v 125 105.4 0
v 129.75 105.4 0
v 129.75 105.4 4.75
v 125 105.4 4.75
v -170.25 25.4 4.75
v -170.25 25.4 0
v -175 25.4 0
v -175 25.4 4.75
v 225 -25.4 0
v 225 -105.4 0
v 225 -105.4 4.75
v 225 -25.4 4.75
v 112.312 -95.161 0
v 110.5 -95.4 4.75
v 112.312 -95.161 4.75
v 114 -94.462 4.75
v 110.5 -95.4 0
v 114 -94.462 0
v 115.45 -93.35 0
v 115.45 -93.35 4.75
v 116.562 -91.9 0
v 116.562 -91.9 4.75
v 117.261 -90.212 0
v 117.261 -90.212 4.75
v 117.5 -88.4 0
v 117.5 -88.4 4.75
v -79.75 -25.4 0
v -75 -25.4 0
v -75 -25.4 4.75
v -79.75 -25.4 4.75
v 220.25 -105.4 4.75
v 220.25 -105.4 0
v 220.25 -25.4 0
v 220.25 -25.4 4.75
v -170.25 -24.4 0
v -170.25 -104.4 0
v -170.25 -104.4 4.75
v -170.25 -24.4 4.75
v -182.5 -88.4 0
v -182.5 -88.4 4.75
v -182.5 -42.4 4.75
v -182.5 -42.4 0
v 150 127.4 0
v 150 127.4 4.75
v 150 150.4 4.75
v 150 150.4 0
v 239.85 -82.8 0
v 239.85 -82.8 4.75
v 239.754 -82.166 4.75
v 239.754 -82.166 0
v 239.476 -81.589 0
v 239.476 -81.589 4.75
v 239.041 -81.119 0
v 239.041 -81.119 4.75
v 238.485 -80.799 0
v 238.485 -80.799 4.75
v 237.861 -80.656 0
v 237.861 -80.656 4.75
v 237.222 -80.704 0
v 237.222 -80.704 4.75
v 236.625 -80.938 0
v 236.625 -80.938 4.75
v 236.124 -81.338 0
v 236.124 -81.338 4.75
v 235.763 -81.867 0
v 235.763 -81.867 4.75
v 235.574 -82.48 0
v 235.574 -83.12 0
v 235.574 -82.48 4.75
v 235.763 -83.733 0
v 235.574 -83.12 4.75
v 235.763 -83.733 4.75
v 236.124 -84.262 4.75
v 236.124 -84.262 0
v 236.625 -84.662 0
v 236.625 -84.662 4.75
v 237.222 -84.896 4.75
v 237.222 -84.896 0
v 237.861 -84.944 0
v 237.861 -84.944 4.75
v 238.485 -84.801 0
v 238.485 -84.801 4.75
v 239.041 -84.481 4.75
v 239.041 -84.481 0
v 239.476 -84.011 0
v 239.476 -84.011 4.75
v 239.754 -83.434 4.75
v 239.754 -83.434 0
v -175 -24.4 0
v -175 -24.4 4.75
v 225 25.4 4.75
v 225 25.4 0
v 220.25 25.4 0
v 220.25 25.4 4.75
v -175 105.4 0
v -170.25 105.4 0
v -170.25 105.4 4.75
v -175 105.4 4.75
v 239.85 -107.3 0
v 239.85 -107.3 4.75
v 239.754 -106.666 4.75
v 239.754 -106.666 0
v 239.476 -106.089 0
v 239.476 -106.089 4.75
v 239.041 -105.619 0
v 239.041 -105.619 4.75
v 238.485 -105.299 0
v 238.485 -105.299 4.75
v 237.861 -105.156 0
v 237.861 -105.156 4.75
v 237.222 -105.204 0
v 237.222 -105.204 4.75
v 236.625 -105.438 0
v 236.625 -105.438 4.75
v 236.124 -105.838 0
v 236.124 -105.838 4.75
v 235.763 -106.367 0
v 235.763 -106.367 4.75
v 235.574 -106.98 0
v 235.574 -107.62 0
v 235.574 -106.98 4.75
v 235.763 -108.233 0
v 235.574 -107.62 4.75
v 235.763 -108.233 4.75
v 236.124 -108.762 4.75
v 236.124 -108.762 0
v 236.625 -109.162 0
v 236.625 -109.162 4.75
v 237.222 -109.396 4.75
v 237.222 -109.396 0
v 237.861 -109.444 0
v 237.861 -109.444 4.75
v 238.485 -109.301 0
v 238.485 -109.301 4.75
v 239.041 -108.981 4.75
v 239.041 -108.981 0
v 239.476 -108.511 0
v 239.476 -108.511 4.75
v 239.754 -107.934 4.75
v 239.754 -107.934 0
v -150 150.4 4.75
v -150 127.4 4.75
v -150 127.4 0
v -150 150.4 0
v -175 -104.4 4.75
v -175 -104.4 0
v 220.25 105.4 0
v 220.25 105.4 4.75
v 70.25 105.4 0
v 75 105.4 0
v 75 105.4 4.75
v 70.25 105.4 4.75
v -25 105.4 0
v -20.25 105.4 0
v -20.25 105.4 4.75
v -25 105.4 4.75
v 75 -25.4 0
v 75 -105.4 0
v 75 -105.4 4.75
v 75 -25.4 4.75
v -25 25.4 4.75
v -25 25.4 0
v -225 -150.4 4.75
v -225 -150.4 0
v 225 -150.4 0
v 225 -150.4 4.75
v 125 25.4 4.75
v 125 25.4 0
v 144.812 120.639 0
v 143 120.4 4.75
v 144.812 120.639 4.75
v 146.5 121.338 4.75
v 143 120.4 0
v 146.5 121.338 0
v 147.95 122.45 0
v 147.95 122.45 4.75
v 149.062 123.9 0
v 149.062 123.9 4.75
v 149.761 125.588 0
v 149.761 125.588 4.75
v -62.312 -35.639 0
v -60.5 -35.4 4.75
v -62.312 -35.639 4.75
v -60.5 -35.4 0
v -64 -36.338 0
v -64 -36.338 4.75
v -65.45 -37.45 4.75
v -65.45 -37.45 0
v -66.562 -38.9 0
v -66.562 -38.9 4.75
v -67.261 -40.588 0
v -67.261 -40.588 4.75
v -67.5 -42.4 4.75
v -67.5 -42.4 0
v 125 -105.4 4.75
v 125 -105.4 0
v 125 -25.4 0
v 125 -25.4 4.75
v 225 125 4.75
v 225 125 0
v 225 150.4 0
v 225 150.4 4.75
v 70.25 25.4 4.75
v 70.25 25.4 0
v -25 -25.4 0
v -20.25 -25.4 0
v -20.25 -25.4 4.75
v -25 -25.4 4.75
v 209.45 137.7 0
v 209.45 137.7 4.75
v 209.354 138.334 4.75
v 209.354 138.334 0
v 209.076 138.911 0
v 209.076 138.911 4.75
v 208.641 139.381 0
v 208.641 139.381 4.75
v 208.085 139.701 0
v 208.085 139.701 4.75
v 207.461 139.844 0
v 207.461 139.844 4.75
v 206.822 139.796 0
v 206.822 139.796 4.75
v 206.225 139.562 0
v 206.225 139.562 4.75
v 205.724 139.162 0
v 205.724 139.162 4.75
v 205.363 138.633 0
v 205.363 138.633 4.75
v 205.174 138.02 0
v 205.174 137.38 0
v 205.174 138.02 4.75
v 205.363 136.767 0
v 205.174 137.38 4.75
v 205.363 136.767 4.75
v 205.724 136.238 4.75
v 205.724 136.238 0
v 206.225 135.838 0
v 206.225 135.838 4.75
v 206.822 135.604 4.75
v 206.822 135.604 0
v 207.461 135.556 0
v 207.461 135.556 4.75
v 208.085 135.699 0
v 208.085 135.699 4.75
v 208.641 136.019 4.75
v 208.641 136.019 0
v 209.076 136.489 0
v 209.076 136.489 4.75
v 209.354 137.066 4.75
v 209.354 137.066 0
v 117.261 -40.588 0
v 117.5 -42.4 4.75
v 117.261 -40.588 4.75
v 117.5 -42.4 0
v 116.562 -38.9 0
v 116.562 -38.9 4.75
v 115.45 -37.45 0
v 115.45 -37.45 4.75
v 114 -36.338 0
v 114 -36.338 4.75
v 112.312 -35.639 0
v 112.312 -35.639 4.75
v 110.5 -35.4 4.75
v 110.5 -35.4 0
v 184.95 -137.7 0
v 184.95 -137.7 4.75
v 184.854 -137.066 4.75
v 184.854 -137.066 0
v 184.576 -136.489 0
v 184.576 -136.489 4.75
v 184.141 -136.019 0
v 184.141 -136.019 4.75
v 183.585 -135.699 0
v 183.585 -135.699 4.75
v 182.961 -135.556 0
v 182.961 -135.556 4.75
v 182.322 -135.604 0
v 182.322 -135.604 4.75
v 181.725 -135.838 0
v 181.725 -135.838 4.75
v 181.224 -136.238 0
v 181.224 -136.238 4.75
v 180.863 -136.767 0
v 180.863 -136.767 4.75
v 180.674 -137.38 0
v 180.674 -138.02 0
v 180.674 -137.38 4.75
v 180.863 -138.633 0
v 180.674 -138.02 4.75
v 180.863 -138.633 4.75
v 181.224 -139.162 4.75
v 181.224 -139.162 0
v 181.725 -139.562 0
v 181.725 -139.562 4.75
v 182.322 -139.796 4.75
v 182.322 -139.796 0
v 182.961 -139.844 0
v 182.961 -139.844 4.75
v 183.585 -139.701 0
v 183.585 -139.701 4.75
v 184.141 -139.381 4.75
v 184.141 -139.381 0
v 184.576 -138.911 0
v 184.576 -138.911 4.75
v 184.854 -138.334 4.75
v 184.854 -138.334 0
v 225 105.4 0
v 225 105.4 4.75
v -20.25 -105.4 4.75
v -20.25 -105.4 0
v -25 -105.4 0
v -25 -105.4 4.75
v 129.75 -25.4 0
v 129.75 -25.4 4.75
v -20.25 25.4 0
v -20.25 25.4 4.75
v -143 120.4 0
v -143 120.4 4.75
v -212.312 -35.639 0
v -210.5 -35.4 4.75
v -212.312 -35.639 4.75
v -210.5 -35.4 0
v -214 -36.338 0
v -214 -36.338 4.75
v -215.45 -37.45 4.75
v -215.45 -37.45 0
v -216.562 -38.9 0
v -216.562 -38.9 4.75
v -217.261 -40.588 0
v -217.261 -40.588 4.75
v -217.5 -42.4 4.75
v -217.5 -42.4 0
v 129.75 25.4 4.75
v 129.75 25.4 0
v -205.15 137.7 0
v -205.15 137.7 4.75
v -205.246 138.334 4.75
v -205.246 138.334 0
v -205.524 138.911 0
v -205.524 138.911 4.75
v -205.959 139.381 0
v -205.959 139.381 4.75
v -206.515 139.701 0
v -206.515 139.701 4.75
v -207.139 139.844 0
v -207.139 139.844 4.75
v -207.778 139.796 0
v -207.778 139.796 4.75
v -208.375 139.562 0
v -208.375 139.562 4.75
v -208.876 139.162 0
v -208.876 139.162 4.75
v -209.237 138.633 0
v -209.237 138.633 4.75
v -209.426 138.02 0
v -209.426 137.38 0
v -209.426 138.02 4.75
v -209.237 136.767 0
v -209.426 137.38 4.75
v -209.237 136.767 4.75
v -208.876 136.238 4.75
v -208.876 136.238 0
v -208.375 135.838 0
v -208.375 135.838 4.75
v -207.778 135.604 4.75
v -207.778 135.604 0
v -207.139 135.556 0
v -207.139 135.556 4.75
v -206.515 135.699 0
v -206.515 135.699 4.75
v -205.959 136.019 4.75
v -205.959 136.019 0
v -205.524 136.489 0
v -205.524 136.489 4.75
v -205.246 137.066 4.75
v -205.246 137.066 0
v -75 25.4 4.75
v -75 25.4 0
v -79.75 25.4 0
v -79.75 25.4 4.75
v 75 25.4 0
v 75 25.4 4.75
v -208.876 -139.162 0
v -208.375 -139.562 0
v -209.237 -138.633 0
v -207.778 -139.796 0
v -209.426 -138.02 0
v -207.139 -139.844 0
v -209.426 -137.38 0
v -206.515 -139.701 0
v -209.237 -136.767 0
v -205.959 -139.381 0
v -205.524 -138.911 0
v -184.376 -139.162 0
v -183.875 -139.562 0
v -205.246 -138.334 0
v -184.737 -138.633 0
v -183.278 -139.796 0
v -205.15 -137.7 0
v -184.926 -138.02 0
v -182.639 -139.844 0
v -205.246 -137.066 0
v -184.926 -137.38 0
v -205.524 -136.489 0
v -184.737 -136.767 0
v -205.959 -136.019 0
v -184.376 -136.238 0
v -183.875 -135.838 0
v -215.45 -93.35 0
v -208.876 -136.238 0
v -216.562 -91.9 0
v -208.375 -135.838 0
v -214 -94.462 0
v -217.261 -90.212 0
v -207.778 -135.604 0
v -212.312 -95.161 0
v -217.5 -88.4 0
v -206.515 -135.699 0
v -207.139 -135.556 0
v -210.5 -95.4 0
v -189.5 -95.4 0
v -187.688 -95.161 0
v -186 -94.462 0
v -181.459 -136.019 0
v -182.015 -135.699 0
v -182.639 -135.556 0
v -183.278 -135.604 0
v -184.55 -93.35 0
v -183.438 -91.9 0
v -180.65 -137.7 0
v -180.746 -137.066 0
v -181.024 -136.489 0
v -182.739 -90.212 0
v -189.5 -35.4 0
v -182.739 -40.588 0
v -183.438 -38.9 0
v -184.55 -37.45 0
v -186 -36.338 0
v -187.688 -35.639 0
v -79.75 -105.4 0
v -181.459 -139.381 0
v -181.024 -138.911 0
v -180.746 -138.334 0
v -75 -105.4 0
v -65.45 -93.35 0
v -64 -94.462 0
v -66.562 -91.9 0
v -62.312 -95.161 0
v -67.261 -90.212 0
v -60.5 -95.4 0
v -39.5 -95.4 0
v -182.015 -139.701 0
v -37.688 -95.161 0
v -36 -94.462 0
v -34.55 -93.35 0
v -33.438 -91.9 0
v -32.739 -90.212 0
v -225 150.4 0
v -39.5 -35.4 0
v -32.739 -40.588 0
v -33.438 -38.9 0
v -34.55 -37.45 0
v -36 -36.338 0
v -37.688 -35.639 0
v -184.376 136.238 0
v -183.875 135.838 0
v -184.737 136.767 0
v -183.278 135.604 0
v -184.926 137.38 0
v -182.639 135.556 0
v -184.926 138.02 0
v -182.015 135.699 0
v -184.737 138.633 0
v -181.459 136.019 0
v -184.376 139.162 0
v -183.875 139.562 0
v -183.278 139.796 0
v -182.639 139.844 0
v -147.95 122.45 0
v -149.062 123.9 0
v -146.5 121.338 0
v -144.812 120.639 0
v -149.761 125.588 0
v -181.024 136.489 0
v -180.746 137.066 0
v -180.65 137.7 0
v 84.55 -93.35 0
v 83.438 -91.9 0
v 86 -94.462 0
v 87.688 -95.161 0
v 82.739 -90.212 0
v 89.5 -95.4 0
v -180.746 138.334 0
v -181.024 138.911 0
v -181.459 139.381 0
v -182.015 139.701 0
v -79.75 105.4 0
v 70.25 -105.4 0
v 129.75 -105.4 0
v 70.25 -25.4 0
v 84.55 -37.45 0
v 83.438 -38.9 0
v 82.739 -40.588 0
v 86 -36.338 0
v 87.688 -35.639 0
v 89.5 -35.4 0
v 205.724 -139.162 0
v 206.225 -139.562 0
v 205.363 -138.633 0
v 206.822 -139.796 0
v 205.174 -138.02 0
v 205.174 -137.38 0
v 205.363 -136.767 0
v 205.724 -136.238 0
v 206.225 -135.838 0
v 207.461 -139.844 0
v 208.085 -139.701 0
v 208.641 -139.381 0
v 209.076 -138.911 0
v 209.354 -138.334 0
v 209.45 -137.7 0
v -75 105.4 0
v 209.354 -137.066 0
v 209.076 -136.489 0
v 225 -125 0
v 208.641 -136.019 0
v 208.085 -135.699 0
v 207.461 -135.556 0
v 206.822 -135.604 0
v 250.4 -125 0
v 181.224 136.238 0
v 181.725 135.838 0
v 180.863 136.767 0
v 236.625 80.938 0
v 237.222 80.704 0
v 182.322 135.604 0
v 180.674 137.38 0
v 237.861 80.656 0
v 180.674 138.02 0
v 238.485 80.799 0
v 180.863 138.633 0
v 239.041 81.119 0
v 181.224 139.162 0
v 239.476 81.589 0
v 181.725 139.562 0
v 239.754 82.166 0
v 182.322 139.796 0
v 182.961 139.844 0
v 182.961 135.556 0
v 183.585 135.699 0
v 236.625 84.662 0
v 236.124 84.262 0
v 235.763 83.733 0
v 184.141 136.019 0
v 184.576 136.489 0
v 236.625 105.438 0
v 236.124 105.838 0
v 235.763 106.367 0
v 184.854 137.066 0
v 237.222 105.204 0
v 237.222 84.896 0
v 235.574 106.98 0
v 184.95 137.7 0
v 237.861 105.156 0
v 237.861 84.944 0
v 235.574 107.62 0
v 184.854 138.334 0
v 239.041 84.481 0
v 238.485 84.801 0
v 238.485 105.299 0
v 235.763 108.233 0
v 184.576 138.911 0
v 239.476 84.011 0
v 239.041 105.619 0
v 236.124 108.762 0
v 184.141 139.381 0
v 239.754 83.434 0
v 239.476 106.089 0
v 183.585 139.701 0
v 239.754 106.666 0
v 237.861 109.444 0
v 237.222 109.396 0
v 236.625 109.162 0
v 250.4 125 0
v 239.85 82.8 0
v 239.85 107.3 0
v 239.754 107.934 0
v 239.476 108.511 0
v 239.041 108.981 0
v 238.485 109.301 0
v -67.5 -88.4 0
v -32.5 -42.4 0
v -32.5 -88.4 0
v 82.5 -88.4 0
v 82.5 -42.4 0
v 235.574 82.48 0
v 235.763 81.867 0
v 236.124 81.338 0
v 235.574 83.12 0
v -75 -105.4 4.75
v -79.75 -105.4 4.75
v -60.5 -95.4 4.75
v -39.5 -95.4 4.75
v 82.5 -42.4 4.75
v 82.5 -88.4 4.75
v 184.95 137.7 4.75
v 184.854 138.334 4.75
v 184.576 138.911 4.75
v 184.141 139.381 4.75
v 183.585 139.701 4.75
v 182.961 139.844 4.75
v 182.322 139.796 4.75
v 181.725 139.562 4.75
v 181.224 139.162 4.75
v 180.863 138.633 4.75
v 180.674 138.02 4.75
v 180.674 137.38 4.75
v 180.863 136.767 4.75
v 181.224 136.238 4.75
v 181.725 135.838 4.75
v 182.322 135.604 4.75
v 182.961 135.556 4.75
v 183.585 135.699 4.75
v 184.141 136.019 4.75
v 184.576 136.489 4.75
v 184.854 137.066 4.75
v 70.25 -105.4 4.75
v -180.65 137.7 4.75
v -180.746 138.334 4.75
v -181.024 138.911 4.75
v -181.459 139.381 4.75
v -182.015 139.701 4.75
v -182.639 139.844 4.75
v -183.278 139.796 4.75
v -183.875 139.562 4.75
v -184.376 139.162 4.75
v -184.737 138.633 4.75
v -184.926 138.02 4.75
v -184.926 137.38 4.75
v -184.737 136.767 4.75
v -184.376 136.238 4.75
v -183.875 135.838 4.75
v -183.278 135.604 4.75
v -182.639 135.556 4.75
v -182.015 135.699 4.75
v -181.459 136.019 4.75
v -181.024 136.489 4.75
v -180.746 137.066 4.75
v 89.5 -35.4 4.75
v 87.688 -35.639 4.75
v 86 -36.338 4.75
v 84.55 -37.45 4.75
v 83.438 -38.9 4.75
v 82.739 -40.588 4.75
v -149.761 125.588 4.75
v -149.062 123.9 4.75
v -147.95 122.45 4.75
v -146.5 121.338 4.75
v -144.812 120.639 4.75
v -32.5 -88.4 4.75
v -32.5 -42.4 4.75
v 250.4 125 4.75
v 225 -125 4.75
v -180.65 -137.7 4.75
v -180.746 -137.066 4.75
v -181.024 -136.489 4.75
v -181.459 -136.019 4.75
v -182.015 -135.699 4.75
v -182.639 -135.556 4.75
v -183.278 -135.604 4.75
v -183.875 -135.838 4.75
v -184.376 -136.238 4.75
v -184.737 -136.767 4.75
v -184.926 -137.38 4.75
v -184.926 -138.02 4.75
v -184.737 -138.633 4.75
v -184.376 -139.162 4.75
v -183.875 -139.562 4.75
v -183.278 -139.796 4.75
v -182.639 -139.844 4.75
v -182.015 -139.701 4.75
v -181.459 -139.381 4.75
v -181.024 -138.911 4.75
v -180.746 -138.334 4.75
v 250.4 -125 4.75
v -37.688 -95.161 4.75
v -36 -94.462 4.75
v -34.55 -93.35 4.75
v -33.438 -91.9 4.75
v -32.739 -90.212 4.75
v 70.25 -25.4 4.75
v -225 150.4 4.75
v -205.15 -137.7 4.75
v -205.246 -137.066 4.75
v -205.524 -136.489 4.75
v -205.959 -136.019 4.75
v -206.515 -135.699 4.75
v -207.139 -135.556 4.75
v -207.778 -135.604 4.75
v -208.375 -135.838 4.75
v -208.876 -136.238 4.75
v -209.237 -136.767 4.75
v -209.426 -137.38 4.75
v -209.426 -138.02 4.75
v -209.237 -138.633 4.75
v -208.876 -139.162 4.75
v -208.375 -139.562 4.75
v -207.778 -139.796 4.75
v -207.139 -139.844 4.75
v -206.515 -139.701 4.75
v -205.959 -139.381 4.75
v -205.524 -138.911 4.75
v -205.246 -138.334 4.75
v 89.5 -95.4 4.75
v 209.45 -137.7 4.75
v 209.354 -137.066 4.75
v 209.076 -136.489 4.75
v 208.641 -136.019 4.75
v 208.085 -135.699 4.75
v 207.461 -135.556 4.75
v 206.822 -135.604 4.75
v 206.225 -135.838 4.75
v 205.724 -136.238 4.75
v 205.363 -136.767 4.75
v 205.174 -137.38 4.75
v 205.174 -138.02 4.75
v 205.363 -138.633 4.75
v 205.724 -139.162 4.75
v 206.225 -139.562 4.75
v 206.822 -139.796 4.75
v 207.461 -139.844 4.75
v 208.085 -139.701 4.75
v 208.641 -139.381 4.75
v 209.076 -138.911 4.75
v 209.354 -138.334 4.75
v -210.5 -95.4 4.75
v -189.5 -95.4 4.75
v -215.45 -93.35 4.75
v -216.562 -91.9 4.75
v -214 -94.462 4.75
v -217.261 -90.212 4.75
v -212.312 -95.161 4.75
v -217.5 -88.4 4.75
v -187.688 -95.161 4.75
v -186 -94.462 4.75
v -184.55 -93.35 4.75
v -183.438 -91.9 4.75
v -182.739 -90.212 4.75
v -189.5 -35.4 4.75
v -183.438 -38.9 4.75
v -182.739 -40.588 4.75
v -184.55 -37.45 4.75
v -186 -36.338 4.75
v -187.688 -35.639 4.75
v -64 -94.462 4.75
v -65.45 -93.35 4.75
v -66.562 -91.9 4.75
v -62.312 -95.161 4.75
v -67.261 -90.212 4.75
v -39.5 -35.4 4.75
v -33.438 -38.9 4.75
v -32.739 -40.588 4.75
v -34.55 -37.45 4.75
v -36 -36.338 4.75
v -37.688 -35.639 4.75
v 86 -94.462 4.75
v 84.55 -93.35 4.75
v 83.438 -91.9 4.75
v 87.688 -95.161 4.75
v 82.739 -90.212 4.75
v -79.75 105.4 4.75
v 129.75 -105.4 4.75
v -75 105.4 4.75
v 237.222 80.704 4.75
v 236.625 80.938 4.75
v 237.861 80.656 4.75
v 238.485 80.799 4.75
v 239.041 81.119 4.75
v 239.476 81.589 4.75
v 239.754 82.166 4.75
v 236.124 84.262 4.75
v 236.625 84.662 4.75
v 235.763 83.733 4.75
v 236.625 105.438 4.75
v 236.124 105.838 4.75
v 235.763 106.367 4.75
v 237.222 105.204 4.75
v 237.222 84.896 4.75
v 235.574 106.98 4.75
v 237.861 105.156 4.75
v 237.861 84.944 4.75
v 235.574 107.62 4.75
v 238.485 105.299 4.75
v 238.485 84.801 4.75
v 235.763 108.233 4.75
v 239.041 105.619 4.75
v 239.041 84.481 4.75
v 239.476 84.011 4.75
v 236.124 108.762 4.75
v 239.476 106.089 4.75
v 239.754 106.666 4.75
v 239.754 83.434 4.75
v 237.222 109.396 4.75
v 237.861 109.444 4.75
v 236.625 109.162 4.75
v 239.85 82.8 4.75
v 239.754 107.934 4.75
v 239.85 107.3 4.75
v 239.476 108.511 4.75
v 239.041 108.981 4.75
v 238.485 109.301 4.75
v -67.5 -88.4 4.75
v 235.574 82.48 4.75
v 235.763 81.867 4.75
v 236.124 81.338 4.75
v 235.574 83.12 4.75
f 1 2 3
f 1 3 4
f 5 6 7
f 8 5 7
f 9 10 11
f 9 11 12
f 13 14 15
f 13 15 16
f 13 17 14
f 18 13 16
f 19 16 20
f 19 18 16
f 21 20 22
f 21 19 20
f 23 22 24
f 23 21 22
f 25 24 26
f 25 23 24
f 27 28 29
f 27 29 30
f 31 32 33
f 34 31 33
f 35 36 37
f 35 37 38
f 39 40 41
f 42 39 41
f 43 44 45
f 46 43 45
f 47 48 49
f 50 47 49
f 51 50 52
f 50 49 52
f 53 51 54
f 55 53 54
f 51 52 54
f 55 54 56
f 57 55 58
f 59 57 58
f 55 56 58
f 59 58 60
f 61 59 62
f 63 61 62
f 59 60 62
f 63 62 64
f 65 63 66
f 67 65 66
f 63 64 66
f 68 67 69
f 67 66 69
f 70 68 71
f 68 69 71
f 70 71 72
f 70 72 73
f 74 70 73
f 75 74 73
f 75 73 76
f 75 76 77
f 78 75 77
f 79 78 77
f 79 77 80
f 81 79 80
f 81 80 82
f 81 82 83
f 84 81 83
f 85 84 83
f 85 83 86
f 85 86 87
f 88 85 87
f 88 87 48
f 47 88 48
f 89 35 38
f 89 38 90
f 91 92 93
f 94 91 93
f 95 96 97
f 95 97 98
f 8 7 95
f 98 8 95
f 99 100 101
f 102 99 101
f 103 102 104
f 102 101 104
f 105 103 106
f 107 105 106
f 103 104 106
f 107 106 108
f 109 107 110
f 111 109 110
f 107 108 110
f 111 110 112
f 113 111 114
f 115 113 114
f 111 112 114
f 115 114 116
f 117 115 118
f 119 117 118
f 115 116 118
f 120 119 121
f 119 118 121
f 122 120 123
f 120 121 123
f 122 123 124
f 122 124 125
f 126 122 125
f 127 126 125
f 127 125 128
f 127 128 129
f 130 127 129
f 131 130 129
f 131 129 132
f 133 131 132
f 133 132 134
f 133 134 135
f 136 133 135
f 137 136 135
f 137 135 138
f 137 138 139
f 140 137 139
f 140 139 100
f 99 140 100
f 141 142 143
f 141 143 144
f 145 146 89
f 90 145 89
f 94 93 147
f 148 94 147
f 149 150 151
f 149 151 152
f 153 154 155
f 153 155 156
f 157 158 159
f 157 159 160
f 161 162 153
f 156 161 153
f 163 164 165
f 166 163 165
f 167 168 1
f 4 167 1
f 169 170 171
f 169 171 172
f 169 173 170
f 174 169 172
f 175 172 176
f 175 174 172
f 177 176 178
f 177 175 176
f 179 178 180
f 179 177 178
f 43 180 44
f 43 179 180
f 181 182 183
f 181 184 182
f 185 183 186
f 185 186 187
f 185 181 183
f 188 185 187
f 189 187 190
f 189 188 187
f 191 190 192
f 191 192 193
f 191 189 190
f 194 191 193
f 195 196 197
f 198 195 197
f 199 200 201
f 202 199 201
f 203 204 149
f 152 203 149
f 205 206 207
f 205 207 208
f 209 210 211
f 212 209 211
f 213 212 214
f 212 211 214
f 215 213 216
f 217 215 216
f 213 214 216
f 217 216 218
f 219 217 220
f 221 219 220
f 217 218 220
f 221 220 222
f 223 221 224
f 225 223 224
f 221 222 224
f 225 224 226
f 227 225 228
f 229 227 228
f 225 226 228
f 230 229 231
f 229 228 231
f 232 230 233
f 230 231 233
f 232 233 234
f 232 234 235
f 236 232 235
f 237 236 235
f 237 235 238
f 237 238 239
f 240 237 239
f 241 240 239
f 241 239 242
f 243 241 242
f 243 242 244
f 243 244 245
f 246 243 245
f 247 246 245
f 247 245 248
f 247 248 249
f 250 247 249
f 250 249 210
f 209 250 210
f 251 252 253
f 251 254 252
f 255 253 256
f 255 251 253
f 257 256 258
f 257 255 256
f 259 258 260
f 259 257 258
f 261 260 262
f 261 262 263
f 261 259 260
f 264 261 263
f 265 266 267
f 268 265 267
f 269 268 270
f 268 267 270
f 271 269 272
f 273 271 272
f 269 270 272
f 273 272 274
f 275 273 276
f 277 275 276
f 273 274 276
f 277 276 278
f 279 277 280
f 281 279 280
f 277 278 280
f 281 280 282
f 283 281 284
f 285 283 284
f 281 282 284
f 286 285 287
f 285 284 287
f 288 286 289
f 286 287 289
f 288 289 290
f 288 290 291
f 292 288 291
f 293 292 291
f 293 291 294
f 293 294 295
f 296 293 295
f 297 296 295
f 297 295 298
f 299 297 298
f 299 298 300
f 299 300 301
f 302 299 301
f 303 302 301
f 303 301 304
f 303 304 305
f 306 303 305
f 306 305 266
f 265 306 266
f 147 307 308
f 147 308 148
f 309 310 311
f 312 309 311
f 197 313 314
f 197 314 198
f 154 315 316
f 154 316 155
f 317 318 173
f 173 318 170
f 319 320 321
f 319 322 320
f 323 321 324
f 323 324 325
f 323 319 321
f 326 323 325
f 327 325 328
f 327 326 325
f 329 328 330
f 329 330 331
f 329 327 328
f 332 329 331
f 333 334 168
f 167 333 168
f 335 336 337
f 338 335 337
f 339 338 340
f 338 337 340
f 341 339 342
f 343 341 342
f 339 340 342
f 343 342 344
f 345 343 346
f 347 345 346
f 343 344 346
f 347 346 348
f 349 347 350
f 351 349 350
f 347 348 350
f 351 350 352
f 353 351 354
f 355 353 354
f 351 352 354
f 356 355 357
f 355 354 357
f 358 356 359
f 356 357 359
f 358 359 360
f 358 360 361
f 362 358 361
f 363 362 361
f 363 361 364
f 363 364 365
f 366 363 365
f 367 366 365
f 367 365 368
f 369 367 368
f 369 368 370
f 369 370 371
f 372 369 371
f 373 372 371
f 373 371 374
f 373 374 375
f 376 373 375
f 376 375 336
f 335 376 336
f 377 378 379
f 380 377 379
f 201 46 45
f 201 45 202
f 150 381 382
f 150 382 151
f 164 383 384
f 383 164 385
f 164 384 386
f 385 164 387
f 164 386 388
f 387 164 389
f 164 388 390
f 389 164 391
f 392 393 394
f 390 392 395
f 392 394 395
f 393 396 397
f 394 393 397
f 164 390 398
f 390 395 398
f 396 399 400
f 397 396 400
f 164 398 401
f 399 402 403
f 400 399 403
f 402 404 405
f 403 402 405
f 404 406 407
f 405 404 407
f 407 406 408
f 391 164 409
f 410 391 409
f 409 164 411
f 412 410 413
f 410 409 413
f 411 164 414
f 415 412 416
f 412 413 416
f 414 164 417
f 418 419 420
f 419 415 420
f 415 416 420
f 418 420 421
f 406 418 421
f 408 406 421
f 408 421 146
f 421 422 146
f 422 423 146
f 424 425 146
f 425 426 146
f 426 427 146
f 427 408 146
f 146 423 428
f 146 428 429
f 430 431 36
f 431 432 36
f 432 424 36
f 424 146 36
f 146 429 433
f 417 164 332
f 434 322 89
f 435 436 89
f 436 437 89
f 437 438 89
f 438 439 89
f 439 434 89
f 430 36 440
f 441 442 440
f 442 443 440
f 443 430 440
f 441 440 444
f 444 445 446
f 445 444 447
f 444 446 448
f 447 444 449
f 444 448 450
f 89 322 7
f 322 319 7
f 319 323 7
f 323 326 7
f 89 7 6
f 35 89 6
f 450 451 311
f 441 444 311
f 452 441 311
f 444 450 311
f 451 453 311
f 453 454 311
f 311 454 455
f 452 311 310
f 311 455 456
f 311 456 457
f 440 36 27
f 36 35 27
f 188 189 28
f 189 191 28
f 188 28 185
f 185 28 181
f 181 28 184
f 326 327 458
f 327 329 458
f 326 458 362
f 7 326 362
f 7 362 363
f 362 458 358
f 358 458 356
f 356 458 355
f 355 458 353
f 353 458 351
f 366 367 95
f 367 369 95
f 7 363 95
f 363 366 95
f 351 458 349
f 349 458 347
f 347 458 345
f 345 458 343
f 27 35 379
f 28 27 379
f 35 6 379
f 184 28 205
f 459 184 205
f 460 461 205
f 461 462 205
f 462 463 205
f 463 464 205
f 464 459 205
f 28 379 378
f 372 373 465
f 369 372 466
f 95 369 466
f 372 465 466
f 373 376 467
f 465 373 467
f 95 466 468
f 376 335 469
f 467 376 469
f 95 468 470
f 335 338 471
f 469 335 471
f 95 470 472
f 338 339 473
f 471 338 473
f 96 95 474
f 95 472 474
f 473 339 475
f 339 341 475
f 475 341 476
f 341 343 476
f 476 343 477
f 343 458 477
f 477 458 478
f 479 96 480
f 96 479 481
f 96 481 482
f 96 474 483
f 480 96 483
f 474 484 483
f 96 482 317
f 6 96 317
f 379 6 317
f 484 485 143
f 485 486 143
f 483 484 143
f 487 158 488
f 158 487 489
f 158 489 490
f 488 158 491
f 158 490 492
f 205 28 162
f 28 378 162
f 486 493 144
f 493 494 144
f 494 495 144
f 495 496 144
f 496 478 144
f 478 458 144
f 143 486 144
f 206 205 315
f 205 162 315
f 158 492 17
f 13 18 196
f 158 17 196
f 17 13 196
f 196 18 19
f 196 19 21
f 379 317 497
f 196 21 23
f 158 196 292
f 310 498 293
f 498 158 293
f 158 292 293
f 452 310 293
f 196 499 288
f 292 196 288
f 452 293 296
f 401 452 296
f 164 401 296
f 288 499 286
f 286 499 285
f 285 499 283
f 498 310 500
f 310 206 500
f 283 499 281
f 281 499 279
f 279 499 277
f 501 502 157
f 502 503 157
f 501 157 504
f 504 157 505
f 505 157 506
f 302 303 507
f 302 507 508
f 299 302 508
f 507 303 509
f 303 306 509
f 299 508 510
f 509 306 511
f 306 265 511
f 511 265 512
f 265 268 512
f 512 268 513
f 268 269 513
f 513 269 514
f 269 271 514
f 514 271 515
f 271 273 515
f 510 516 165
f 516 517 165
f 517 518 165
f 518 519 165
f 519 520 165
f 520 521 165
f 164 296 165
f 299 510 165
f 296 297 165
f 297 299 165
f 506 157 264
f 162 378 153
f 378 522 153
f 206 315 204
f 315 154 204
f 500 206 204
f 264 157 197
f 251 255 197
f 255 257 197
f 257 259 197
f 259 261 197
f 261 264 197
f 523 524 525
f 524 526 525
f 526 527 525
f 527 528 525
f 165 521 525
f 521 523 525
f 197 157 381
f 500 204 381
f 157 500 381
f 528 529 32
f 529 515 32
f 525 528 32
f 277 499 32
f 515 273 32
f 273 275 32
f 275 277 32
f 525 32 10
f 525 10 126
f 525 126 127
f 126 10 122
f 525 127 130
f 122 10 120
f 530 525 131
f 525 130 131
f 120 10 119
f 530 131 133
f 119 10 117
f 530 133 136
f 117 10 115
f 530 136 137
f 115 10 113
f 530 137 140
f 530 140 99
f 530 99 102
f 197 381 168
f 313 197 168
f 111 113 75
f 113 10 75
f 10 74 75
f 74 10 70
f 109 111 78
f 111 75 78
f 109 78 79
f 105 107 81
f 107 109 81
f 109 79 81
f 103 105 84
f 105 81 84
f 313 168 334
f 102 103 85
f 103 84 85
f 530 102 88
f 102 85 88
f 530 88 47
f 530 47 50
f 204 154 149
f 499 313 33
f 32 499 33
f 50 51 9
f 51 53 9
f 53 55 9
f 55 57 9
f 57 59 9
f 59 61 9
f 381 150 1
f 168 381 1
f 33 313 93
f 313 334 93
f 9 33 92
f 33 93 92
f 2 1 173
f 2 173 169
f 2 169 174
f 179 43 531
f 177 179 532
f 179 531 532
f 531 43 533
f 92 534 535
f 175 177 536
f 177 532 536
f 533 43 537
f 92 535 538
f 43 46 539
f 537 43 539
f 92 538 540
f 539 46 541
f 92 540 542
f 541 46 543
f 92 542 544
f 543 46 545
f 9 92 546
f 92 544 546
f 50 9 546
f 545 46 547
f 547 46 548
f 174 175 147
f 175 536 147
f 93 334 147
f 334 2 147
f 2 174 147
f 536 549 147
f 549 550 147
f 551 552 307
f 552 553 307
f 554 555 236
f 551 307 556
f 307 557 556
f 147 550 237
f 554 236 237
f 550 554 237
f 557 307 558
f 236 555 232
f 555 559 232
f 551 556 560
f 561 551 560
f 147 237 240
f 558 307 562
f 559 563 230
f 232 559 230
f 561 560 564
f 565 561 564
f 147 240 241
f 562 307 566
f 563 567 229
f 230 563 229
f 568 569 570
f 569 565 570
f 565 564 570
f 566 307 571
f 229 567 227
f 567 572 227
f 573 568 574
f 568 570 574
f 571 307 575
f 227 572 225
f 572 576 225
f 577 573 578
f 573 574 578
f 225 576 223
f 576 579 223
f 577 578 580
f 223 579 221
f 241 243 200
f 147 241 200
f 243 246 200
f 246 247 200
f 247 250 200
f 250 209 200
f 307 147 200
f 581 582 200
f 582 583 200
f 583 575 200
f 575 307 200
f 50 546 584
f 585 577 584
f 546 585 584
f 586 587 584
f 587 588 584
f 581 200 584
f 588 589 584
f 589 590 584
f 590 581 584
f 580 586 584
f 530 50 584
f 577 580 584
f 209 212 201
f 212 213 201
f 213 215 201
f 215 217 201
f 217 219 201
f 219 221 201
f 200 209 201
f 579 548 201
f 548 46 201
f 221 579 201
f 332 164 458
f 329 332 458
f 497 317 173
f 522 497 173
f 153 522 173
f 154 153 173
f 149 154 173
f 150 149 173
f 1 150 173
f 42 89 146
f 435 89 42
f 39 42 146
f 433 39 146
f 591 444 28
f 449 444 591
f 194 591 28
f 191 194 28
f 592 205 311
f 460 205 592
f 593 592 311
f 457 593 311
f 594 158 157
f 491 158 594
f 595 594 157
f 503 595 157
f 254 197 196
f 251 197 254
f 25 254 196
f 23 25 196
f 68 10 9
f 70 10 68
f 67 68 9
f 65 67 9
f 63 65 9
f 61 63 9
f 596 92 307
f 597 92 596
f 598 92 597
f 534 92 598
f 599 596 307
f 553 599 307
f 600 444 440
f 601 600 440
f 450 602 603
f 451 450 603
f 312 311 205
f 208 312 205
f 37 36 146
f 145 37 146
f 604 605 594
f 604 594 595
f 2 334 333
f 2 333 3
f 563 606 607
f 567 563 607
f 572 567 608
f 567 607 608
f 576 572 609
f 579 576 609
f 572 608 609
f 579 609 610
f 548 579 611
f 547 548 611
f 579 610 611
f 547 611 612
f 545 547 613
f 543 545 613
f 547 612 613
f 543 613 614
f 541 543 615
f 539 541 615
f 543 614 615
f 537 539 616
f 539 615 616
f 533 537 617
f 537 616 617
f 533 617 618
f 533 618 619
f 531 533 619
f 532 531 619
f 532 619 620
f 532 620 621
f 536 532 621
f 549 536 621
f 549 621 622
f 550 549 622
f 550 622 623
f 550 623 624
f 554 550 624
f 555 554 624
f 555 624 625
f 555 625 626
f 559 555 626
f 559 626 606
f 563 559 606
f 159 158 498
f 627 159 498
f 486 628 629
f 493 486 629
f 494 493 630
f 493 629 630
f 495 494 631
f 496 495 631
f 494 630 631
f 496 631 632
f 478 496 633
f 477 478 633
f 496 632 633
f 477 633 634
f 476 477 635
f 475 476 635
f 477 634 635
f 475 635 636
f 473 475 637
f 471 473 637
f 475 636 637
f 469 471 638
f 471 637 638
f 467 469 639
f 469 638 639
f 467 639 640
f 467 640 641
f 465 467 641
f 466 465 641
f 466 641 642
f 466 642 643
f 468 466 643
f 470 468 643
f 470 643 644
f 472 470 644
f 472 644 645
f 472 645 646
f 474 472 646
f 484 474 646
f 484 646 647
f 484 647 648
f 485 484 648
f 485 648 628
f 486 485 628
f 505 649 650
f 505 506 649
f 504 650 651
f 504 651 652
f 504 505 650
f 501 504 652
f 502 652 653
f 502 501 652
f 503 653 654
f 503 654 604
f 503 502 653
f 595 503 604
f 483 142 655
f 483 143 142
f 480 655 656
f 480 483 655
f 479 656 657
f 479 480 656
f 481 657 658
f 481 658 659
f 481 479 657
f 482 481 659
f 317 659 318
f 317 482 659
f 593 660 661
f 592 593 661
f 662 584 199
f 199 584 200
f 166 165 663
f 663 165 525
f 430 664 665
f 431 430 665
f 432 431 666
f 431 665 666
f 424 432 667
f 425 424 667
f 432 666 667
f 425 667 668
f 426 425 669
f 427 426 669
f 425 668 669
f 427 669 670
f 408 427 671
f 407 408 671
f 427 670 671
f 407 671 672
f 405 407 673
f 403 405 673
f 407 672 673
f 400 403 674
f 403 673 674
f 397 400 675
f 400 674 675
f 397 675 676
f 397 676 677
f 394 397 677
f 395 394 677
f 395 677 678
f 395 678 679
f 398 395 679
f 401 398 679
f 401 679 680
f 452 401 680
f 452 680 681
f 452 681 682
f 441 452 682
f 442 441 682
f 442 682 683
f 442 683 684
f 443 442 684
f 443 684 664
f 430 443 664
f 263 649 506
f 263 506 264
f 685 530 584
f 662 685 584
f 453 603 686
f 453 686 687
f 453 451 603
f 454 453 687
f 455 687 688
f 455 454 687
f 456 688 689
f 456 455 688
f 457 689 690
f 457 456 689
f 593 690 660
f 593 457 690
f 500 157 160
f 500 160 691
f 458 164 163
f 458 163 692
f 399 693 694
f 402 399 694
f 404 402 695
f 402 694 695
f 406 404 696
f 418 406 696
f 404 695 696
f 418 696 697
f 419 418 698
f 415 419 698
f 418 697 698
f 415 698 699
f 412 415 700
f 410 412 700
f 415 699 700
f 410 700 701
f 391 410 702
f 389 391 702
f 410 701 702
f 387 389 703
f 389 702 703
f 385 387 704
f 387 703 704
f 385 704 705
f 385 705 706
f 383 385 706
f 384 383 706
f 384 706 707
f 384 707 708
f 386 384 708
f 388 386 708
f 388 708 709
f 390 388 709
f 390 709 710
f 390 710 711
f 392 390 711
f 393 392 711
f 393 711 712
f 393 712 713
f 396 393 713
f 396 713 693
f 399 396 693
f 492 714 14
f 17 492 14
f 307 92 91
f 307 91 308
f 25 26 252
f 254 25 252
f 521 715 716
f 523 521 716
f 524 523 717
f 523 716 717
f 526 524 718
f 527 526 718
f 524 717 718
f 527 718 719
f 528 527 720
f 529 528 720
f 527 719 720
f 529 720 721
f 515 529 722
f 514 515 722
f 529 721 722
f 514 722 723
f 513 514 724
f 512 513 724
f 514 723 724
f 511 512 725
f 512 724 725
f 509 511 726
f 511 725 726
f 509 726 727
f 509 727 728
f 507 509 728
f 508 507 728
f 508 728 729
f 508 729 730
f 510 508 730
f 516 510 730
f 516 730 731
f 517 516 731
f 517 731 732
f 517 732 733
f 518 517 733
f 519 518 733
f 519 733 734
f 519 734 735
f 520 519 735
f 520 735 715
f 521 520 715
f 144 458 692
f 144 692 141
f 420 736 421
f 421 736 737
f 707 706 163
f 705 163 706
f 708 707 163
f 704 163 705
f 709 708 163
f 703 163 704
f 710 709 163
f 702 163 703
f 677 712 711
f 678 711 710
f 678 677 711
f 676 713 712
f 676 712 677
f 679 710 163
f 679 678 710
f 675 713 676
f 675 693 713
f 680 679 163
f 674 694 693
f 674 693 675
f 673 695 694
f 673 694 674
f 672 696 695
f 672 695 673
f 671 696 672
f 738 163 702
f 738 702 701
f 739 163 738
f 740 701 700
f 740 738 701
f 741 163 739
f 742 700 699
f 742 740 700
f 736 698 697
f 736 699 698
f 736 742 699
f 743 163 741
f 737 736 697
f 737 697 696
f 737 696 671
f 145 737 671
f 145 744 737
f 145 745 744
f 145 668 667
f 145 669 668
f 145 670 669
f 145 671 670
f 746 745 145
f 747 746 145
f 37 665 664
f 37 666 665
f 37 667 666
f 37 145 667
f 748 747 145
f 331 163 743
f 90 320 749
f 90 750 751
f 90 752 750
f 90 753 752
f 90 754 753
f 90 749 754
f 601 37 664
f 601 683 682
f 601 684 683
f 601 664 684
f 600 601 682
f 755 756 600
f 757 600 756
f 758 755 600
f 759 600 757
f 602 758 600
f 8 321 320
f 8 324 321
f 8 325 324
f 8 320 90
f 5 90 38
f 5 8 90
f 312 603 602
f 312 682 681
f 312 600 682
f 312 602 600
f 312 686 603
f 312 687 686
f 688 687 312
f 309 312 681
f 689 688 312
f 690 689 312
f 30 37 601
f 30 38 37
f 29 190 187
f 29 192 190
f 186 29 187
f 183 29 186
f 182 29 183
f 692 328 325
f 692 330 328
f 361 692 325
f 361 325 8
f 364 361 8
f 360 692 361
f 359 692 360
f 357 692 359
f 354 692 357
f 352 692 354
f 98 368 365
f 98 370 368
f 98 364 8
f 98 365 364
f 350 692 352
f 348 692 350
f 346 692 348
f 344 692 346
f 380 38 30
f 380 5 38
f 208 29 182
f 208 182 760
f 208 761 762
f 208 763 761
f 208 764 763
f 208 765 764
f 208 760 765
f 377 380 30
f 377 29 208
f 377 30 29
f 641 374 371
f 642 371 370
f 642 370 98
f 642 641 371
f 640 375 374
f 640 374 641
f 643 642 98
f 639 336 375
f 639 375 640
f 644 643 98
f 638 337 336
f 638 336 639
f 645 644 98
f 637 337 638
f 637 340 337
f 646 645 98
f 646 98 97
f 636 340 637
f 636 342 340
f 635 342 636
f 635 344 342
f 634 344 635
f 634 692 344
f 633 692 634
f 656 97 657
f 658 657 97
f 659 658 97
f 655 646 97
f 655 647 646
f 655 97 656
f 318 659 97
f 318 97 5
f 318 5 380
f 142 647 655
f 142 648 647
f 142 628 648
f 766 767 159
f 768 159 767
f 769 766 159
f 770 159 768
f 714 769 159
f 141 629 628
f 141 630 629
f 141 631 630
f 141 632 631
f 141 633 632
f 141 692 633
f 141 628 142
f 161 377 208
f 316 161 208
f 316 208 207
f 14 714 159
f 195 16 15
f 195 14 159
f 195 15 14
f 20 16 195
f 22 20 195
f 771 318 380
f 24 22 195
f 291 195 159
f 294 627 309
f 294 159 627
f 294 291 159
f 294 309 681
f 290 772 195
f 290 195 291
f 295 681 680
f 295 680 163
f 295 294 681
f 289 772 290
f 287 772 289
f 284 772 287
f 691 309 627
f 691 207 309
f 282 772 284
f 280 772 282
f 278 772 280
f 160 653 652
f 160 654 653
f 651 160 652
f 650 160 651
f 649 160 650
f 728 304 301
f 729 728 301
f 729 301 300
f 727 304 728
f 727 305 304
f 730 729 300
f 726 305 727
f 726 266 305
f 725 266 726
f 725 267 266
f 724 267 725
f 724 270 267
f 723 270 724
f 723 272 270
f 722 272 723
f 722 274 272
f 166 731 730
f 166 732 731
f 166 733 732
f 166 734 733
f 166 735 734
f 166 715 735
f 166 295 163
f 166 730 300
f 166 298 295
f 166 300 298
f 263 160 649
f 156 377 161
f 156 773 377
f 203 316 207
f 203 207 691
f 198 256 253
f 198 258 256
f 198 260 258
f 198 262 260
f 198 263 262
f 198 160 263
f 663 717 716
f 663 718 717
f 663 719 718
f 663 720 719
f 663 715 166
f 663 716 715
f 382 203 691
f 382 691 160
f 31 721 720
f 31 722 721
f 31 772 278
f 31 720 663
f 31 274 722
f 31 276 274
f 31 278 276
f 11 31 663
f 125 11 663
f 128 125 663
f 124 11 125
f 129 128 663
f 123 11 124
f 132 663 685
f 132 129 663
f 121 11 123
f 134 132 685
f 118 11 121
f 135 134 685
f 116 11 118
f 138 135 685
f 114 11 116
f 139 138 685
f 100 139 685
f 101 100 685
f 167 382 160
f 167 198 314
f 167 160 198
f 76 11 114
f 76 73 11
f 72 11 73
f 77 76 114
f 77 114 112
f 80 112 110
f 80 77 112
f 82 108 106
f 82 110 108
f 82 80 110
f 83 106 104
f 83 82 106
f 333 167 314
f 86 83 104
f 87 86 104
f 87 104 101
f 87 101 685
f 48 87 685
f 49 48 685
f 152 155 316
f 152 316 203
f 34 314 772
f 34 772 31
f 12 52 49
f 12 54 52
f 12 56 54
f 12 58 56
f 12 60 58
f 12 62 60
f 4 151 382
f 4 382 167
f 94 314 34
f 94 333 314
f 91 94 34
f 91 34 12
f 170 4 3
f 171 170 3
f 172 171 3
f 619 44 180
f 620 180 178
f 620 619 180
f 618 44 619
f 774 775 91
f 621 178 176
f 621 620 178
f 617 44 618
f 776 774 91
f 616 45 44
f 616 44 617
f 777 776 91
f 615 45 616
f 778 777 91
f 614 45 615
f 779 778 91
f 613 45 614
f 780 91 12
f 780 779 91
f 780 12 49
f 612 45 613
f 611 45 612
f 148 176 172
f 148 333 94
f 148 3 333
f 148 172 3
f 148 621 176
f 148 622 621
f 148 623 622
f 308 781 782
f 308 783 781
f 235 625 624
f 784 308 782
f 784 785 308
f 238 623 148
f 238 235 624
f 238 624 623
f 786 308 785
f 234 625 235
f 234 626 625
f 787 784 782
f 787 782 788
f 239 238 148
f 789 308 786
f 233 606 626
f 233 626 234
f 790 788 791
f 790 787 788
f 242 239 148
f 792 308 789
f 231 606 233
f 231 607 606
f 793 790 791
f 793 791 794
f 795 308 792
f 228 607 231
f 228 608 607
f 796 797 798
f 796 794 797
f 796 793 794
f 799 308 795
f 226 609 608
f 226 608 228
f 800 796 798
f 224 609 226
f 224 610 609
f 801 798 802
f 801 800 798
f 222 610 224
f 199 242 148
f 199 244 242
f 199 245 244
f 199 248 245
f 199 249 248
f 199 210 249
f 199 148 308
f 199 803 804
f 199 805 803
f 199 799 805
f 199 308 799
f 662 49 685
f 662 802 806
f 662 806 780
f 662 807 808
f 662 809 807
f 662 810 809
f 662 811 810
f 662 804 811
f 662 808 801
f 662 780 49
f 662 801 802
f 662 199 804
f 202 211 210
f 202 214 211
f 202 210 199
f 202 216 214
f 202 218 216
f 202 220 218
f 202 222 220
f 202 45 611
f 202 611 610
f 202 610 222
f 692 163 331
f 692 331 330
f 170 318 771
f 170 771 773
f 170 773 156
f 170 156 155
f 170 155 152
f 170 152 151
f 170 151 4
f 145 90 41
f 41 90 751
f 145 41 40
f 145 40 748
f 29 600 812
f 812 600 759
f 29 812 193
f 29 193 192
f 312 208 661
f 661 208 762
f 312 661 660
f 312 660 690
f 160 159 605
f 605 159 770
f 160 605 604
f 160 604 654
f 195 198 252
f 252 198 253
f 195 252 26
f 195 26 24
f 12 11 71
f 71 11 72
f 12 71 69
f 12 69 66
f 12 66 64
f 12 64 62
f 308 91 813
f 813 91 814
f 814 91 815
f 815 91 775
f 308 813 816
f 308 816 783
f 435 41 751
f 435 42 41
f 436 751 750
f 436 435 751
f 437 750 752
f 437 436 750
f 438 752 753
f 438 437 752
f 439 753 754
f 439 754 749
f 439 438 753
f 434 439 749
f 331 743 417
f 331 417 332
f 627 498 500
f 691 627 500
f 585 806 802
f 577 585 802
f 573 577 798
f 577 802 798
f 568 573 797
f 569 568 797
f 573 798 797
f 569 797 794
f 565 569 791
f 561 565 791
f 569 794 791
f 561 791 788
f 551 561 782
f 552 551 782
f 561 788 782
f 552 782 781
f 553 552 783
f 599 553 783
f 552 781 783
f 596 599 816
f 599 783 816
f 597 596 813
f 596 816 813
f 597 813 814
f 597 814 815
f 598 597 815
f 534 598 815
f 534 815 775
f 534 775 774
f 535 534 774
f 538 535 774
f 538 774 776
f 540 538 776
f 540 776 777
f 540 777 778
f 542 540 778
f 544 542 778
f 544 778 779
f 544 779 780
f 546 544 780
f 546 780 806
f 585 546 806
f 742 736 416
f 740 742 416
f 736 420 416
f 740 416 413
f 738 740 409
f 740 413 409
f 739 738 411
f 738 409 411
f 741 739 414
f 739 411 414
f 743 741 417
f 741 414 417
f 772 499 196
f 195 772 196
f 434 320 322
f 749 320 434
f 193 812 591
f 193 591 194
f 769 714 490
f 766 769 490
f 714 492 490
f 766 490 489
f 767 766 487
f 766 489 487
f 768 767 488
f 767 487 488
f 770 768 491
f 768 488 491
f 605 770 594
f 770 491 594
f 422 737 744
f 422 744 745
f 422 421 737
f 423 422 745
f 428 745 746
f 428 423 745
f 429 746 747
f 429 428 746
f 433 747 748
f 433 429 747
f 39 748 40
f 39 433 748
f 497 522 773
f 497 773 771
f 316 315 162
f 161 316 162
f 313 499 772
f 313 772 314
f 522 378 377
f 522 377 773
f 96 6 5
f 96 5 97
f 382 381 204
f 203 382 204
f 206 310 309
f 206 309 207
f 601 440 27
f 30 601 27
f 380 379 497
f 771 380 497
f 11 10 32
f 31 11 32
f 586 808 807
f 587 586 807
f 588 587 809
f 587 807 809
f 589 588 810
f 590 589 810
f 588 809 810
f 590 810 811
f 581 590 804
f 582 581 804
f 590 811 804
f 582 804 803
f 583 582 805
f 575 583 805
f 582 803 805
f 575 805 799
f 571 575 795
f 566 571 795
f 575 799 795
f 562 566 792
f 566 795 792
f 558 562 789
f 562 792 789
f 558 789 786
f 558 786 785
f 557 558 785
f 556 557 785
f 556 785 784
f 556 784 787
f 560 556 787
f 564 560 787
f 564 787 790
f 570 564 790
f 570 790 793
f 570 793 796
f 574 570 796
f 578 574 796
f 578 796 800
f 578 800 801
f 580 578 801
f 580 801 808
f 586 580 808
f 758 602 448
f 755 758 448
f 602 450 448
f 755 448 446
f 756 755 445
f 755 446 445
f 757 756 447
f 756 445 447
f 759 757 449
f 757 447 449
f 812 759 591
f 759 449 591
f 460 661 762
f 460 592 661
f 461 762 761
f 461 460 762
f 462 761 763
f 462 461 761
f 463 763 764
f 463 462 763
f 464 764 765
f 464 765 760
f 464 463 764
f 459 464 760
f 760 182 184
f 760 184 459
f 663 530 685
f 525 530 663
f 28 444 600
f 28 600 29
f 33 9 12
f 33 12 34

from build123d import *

# Parameters (mm, degrees)
SKETCH_1_W          = 500.8
SKETCH_1_H          = 300.8
EXTRUDE_1_DEPTH     = 4.75
SKETCH_2_W          = 25.4
SKETCH_2_H          = 25.4
SKETCH_2_H_2        = 300.8
SKETCH_2_W_2        = 4.75
SKETCH_2_H_3        = 80
CUT_EXTRUDE_1_DEPTH = 10
SKETCH_3_R          = 2.15
SKETCH_3_R_2        = 2.150000004
CUT_EXTRUDE_2_DEPTH = 5
SKETCH_5_W          = 35
SKETCH_5_H          = 60
SKETCH_5_W_2        = 300
SKETCH_5_H_2        = 30
CUT_EXTRUDE_3_DEPTH = 10
FILLET_1_R          = 7


with BuildPart() as part:
    # 草圖1 → 填料-伸長1 (new body)
    with BuildSketch(Plane.XY):
        Rectangle(SKETCH_1_W, SKETCH_1_H)
    extrude(amount=EXTRUDE_1_DEPTH)

    # 草圖2 → 除料-伸長1 (cut)
    with BuildSketch(Plane(origin=(0, 0, 0), x_dir=(-1, 0, 0), z_dir=(0, 0, -1))):
        with Locations((-237.7, 137.7)):
            Rectangle(SKETCH_2_W, SKETCH_2_H)
        with Locations((-237.7, -137.7)):
            Rectangle(SKETCH_2_W, SKETCH_2_H)
        with Locations((237.7, 0)):
            Rectangle(SKETCH_2_W, SKETCH_2_H_2)
        with Locations((-222.625, 65.4)):
            Rectangle(SKETCH_2_W_2, SKETCH_2_H_3)
        with Locations((-222.625, -65.4)):
            Rectangle(SKETCH_2_W_2, SKETCH_2_H_3)
        with Locations((172.625, 65.4)):
            Rectangle(SKETCH_2_W_2, SKETCH_2_H_3)
        with Locations((172.625, -64.4)):
            Rectangle(SKETCH_2_W_2, SKETCH_2_H_3)
        with Locations((-127.375, 65.4)):
            Rectangle(SKETCH_2_W_2, SKETCH_2_H_3)
        with Locations((-72.625, 65.4)):
            Rectangle(SKETCH_2_W_2, SKETCH_2_H_3)
        with Locations((22.625, 65.4)):
            Rectangle(SKETCH_2_W_2, SKETCH_2_H_3)
        with Locations((77.375, 65.4)):
            Rectangle(SKETCH_2_W_2, SKETCH_2_H_3)
        with Locations((77.375, -65.4)):
            Rectangle(SKETCH_2_W_2, SKETCH_2_H_3)
        with Locations((22.625, -65.4)):
            Rectangle(SKETCH_2_W_2, SKETCH_2_H_3)
        with Locations((-127.375, -65.4)):
            Rectangle(SKETCH_2_W_2, SKETCH_2_H_3)
        with Locations((-72.625, -65.4)):
            Rectangle(SKETCH_2_W_2, SKETCH_2_H_3)
    extrude(amount=-CUT_EXTRUDE_1_DEPTH, mode=Mode.SUBTRACT)

    # 草圖3 → 除料-伸長2 (cut)
    with BuildSketch(Plane.XY.offset(4.75)):
        with Locations((-207.3, 137.7)):
            Circle(SKETCH_3_R)
        with Locations((-182.8, 137.7)):
            Circle(SKETCH_3_R)
        with Locations((182.8, 137.7)):
            Circle(SKETCH_3_R)
        with Locations((207.3, 137.7)):
            Circle(SKETCH_3_R)
        with Locations((237.7, 107.3)):
            Circle(SKETCH_3_R)
        with Locations((237.7, 82.8)):
            Circle(SKETCH_3_R)
        with Locations((237.7, -82.800000014)):
            Circle(SKETCH_3_R_2)
        with Locations((237.7, -107.300000014)):
            Circle(SKETCH_3_R_2)
        with Locations((207.3, -137.7)):
            Circle(SKETCH_3_R)
        with Locations((182.8, -137.7)):
            Circle(SKETCH_3_R)
        with Locations((-207.3, -137.7)):
            Circle(SKETCH_3_R)
        with Locations((-182.8, -137.7)):
            Circle(SKETCH_3_R)
    extrude(amount=-CUT_EXTRUDE_2_DEPTH, mode=Mode.SUBTRACT)

    # 草圖5 → 除料-伸長3 (cut)
    with BuildSketch(Plane.XY.offset(4.75)):
        with Locations((100, -65.4)):
            Rectangle(SKETCH_5_W, SKETCH_5_H)
        with Locations((-50, -65.4)):
            Rectangle(SKETCH_5_W, SKETCH_5_H)
        with Locations((-200, -65.4)):
            Rectangle(SKETCH_5_W, SKETCH_5_H)
        with Locations((0, 135.4)):
            Rectangle(SKETCH_5_W_2, SKETCH_5_H_2)
    extrude(amount=-CUT_EXTRUDE_3_DEPTH, mode=Mode.SUBTRACT)

    # 圓角1
    fillet_1_edges = [part.edges().sort_by_distance(p)[0] for p in [
        (-150, 120.4, 2.375),
        (150, 120.4, 2.375),
        (-182.5, -35.4, 2.375),
        (-182.5, -95.4, 2.375),
        (-217.5, -95.4, 2.375),
        (-217.5, -35.4, 2.375),
        (-32.5, -35.4, 2.375),
        (-32.5, -95.4, 2.375),
        (-67.5, -95.4, 2.375),
        (-67.5, -35.4, 2.375),
        (117.5, -35.4, 2.375),
        (117.5, -95.4, 2.375),
        (82.5, -95.4, 2.375),
        (82.5, -35.4, 2.375),
    ]]
    fillet(fillet_1_edges, radius=FILLET_1_R)


solid = part.part
